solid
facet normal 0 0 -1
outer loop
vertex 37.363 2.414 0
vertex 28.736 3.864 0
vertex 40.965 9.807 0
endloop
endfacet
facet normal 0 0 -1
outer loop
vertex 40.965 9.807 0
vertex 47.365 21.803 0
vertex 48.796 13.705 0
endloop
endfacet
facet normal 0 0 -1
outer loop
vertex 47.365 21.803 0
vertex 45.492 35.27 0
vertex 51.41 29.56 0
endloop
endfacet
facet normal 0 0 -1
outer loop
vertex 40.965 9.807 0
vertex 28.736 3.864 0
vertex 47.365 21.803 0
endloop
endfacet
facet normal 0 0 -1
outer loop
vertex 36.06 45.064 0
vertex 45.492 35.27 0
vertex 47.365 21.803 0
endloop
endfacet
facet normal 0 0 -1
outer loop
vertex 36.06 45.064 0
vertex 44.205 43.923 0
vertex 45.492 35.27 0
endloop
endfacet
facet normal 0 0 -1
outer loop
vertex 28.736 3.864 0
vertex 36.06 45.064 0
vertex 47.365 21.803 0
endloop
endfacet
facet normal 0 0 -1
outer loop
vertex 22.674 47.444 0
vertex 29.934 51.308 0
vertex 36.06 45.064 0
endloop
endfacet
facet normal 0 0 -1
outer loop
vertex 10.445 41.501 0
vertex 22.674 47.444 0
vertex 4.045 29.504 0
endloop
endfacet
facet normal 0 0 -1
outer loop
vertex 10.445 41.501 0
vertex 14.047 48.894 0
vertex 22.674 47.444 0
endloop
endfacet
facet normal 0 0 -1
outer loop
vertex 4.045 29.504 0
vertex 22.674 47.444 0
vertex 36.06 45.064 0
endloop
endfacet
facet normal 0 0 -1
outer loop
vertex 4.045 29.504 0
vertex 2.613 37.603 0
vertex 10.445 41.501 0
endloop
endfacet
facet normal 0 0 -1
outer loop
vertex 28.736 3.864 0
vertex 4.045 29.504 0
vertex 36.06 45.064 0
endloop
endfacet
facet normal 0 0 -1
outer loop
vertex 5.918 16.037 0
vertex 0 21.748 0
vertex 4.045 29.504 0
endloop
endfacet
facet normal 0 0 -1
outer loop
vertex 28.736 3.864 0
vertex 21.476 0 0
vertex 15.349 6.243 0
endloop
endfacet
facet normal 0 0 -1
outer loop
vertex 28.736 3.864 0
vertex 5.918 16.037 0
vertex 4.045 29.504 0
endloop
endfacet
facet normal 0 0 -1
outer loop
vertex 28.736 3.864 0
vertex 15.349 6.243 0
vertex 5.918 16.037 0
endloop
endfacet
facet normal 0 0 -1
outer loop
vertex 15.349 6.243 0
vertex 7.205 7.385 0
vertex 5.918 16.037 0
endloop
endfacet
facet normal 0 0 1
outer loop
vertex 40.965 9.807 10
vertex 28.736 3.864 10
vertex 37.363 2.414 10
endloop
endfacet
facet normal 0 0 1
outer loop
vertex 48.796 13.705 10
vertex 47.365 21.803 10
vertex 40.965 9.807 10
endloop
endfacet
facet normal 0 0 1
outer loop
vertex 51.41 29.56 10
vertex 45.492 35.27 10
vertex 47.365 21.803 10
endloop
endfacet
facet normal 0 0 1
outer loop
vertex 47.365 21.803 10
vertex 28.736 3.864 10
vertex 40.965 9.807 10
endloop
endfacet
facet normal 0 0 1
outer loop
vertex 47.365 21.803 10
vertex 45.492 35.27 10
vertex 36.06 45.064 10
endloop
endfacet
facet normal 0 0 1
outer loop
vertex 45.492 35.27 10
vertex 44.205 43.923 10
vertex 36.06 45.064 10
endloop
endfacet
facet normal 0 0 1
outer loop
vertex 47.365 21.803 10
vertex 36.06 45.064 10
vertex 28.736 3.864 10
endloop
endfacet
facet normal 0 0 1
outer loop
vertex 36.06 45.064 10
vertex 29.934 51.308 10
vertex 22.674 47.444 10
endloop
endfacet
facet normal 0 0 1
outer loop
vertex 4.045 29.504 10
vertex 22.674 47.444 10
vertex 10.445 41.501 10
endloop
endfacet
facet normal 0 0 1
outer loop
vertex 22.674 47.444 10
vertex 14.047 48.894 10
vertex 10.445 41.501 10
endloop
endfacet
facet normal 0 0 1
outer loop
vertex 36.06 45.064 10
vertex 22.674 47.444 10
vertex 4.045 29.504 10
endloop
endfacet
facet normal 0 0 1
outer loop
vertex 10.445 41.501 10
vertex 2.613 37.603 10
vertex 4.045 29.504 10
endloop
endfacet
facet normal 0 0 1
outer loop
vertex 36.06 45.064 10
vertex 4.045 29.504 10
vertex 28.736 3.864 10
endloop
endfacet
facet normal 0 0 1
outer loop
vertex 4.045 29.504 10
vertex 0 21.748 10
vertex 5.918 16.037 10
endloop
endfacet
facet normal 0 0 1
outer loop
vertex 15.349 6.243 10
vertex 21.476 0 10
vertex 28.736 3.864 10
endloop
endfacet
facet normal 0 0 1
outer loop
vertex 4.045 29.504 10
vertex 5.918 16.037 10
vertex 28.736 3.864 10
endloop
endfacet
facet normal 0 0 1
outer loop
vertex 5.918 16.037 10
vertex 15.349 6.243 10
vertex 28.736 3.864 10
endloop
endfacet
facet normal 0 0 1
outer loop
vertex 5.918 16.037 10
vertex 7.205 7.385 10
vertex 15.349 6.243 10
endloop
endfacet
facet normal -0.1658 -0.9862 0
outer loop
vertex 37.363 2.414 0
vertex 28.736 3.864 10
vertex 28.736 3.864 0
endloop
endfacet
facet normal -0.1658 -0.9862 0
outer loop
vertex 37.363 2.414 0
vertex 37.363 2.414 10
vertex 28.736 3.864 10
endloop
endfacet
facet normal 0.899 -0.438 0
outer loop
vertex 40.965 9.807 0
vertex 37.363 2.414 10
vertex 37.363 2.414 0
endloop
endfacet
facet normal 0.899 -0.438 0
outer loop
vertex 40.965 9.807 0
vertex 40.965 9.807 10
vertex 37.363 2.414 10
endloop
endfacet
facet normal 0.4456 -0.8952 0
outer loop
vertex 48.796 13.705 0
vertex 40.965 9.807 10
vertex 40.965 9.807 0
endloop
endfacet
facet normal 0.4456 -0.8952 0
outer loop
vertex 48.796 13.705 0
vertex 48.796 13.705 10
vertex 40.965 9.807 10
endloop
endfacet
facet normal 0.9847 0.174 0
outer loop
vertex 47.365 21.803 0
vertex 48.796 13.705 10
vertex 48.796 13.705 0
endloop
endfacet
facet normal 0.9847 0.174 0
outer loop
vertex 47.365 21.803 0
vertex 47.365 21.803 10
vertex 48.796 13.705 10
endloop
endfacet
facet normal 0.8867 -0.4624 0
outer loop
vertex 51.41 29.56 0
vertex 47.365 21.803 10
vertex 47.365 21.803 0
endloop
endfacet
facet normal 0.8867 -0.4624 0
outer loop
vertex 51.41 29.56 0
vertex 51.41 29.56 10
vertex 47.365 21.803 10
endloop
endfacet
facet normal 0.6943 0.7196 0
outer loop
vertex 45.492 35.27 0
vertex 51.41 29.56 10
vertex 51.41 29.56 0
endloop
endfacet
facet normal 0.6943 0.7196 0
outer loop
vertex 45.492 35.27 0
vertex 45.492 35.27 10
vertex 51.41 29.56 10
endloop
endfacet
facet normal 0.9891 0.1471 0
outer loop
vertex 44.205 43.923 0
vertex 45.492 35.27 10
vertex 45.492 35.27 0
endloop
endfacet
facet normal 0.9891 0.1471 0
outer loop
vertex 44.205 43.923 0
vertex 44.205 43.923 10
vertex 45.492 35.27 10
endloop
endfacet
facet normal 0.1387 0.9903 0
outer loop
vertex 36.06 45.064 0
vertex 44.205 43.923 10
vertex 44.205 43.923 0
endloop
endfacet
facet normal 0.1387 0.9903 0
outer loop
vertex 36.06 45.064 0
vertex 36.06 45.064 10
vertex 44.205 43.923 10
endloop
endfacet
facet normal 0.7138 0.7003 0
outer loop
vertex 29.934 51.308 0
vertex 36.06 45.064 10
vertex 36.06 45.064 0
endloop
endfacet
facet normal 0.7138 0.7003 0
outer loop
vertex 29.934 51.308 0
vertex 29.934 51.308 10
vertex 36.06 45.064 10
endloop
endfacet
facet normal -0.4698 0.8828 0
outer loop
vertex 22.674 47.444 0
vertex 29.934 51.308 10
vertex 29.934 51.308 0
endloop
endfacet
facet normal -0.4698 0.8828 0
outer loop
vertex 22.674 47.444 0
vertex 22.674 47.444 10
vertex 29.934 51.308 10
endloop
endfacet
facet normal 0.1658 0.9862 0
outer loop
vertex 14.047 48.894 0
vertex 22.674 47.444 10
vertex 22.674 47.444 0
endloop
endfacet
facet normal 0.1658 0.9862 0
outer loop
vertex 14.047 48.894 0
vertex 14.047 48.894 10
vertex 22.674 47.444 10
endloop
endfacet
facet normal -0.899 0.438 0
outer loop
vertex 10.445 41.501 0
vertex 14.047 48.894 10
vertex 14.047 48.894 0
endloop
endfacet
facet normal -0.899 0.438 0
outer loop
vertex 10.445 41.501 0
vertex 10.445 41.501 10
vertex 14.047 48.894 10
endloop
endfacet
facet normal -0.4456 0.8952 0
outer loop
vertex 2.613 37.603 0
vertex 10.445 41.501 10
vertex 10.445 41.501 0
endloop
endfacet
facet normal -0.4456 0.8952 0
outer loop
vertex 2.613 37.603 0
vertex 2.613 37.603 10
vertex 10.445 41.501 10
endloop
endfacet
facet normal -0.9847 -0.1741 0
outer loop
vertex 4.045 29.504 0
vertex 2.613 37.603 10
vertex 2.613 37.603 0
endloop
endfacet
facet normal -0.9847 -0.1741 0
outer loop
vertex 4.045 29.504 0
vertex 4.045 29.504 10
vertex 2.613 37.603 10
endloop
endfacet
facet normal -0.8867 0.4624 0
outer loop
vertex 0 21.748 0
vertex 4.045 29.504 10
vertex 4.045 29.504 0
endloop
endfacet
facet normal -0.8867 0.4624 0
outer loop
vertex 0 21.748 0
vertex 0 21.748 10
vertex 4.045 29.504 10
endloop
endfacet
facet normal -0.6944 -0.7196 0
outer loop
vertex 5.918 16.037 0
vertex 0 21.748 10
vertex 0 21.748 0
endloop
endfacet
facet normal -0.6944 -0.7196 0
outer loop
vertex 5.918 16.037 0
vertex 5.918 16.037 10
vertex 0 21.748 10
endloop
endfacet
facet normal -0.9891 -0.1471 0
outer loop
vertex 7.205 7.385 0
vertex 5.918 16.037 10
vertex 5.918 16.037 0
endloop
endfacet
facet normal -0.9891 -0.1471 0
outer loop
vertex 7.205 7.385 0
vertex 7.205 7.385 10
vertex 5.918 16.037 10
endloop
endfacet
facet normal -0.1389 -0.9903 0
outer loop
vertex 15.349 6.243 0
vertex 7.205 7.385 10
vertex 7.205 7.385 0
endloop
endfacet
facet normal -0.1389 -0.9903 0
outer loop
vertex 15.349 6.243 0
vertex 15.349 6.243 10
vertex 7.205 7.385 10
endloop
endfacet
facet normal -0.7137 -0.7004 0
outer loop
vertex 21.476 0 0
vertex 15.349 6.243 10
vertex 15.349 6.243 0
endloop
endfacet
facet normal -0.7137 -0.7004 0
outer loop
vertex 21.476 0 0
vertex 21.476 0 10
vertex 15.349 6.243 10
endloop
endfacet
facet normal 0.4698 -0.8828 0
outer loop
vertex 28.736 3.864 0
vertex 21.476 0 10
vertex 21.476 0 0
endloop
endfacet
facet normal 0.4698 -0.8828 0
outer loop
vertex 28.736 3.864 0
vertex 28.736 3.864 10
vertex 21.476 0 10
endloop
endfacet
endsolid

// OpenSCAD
$fn = 32;

// ----------------------------------------------------------------------
// Chain sprocket: 10 teeth, 22 mm root radius
// ----------------------------------------------------------------------

// --- parameters (mm) ---
profile_height = 10;      // extrusion height
profile_points = 20;      // points of the closed outline

profile = [[47.365, 21.803], [51.41, 29.56], [45.492, 35.27], [44.205, 43.923], [36.06, 45.064], [29.934, 51.308], [22.674, 47.444], [14.047, 48.894], [10.445, 41.501], [2.613, 37.603], [4.045, 29.504], [0, 21.748], [5.918, 16.037], [7.205, 7.385], [15.349, 6.243], [21.476, 0], [28.736, 3.864], [37.363, 2.414], [40.965, 9.807], [48.796, 13.705]];  // single closed polygon, 20 points, counter clockwise

// --- the one profile operation ---
linear_extrude(height = profile_height) polygon(points = profile);
